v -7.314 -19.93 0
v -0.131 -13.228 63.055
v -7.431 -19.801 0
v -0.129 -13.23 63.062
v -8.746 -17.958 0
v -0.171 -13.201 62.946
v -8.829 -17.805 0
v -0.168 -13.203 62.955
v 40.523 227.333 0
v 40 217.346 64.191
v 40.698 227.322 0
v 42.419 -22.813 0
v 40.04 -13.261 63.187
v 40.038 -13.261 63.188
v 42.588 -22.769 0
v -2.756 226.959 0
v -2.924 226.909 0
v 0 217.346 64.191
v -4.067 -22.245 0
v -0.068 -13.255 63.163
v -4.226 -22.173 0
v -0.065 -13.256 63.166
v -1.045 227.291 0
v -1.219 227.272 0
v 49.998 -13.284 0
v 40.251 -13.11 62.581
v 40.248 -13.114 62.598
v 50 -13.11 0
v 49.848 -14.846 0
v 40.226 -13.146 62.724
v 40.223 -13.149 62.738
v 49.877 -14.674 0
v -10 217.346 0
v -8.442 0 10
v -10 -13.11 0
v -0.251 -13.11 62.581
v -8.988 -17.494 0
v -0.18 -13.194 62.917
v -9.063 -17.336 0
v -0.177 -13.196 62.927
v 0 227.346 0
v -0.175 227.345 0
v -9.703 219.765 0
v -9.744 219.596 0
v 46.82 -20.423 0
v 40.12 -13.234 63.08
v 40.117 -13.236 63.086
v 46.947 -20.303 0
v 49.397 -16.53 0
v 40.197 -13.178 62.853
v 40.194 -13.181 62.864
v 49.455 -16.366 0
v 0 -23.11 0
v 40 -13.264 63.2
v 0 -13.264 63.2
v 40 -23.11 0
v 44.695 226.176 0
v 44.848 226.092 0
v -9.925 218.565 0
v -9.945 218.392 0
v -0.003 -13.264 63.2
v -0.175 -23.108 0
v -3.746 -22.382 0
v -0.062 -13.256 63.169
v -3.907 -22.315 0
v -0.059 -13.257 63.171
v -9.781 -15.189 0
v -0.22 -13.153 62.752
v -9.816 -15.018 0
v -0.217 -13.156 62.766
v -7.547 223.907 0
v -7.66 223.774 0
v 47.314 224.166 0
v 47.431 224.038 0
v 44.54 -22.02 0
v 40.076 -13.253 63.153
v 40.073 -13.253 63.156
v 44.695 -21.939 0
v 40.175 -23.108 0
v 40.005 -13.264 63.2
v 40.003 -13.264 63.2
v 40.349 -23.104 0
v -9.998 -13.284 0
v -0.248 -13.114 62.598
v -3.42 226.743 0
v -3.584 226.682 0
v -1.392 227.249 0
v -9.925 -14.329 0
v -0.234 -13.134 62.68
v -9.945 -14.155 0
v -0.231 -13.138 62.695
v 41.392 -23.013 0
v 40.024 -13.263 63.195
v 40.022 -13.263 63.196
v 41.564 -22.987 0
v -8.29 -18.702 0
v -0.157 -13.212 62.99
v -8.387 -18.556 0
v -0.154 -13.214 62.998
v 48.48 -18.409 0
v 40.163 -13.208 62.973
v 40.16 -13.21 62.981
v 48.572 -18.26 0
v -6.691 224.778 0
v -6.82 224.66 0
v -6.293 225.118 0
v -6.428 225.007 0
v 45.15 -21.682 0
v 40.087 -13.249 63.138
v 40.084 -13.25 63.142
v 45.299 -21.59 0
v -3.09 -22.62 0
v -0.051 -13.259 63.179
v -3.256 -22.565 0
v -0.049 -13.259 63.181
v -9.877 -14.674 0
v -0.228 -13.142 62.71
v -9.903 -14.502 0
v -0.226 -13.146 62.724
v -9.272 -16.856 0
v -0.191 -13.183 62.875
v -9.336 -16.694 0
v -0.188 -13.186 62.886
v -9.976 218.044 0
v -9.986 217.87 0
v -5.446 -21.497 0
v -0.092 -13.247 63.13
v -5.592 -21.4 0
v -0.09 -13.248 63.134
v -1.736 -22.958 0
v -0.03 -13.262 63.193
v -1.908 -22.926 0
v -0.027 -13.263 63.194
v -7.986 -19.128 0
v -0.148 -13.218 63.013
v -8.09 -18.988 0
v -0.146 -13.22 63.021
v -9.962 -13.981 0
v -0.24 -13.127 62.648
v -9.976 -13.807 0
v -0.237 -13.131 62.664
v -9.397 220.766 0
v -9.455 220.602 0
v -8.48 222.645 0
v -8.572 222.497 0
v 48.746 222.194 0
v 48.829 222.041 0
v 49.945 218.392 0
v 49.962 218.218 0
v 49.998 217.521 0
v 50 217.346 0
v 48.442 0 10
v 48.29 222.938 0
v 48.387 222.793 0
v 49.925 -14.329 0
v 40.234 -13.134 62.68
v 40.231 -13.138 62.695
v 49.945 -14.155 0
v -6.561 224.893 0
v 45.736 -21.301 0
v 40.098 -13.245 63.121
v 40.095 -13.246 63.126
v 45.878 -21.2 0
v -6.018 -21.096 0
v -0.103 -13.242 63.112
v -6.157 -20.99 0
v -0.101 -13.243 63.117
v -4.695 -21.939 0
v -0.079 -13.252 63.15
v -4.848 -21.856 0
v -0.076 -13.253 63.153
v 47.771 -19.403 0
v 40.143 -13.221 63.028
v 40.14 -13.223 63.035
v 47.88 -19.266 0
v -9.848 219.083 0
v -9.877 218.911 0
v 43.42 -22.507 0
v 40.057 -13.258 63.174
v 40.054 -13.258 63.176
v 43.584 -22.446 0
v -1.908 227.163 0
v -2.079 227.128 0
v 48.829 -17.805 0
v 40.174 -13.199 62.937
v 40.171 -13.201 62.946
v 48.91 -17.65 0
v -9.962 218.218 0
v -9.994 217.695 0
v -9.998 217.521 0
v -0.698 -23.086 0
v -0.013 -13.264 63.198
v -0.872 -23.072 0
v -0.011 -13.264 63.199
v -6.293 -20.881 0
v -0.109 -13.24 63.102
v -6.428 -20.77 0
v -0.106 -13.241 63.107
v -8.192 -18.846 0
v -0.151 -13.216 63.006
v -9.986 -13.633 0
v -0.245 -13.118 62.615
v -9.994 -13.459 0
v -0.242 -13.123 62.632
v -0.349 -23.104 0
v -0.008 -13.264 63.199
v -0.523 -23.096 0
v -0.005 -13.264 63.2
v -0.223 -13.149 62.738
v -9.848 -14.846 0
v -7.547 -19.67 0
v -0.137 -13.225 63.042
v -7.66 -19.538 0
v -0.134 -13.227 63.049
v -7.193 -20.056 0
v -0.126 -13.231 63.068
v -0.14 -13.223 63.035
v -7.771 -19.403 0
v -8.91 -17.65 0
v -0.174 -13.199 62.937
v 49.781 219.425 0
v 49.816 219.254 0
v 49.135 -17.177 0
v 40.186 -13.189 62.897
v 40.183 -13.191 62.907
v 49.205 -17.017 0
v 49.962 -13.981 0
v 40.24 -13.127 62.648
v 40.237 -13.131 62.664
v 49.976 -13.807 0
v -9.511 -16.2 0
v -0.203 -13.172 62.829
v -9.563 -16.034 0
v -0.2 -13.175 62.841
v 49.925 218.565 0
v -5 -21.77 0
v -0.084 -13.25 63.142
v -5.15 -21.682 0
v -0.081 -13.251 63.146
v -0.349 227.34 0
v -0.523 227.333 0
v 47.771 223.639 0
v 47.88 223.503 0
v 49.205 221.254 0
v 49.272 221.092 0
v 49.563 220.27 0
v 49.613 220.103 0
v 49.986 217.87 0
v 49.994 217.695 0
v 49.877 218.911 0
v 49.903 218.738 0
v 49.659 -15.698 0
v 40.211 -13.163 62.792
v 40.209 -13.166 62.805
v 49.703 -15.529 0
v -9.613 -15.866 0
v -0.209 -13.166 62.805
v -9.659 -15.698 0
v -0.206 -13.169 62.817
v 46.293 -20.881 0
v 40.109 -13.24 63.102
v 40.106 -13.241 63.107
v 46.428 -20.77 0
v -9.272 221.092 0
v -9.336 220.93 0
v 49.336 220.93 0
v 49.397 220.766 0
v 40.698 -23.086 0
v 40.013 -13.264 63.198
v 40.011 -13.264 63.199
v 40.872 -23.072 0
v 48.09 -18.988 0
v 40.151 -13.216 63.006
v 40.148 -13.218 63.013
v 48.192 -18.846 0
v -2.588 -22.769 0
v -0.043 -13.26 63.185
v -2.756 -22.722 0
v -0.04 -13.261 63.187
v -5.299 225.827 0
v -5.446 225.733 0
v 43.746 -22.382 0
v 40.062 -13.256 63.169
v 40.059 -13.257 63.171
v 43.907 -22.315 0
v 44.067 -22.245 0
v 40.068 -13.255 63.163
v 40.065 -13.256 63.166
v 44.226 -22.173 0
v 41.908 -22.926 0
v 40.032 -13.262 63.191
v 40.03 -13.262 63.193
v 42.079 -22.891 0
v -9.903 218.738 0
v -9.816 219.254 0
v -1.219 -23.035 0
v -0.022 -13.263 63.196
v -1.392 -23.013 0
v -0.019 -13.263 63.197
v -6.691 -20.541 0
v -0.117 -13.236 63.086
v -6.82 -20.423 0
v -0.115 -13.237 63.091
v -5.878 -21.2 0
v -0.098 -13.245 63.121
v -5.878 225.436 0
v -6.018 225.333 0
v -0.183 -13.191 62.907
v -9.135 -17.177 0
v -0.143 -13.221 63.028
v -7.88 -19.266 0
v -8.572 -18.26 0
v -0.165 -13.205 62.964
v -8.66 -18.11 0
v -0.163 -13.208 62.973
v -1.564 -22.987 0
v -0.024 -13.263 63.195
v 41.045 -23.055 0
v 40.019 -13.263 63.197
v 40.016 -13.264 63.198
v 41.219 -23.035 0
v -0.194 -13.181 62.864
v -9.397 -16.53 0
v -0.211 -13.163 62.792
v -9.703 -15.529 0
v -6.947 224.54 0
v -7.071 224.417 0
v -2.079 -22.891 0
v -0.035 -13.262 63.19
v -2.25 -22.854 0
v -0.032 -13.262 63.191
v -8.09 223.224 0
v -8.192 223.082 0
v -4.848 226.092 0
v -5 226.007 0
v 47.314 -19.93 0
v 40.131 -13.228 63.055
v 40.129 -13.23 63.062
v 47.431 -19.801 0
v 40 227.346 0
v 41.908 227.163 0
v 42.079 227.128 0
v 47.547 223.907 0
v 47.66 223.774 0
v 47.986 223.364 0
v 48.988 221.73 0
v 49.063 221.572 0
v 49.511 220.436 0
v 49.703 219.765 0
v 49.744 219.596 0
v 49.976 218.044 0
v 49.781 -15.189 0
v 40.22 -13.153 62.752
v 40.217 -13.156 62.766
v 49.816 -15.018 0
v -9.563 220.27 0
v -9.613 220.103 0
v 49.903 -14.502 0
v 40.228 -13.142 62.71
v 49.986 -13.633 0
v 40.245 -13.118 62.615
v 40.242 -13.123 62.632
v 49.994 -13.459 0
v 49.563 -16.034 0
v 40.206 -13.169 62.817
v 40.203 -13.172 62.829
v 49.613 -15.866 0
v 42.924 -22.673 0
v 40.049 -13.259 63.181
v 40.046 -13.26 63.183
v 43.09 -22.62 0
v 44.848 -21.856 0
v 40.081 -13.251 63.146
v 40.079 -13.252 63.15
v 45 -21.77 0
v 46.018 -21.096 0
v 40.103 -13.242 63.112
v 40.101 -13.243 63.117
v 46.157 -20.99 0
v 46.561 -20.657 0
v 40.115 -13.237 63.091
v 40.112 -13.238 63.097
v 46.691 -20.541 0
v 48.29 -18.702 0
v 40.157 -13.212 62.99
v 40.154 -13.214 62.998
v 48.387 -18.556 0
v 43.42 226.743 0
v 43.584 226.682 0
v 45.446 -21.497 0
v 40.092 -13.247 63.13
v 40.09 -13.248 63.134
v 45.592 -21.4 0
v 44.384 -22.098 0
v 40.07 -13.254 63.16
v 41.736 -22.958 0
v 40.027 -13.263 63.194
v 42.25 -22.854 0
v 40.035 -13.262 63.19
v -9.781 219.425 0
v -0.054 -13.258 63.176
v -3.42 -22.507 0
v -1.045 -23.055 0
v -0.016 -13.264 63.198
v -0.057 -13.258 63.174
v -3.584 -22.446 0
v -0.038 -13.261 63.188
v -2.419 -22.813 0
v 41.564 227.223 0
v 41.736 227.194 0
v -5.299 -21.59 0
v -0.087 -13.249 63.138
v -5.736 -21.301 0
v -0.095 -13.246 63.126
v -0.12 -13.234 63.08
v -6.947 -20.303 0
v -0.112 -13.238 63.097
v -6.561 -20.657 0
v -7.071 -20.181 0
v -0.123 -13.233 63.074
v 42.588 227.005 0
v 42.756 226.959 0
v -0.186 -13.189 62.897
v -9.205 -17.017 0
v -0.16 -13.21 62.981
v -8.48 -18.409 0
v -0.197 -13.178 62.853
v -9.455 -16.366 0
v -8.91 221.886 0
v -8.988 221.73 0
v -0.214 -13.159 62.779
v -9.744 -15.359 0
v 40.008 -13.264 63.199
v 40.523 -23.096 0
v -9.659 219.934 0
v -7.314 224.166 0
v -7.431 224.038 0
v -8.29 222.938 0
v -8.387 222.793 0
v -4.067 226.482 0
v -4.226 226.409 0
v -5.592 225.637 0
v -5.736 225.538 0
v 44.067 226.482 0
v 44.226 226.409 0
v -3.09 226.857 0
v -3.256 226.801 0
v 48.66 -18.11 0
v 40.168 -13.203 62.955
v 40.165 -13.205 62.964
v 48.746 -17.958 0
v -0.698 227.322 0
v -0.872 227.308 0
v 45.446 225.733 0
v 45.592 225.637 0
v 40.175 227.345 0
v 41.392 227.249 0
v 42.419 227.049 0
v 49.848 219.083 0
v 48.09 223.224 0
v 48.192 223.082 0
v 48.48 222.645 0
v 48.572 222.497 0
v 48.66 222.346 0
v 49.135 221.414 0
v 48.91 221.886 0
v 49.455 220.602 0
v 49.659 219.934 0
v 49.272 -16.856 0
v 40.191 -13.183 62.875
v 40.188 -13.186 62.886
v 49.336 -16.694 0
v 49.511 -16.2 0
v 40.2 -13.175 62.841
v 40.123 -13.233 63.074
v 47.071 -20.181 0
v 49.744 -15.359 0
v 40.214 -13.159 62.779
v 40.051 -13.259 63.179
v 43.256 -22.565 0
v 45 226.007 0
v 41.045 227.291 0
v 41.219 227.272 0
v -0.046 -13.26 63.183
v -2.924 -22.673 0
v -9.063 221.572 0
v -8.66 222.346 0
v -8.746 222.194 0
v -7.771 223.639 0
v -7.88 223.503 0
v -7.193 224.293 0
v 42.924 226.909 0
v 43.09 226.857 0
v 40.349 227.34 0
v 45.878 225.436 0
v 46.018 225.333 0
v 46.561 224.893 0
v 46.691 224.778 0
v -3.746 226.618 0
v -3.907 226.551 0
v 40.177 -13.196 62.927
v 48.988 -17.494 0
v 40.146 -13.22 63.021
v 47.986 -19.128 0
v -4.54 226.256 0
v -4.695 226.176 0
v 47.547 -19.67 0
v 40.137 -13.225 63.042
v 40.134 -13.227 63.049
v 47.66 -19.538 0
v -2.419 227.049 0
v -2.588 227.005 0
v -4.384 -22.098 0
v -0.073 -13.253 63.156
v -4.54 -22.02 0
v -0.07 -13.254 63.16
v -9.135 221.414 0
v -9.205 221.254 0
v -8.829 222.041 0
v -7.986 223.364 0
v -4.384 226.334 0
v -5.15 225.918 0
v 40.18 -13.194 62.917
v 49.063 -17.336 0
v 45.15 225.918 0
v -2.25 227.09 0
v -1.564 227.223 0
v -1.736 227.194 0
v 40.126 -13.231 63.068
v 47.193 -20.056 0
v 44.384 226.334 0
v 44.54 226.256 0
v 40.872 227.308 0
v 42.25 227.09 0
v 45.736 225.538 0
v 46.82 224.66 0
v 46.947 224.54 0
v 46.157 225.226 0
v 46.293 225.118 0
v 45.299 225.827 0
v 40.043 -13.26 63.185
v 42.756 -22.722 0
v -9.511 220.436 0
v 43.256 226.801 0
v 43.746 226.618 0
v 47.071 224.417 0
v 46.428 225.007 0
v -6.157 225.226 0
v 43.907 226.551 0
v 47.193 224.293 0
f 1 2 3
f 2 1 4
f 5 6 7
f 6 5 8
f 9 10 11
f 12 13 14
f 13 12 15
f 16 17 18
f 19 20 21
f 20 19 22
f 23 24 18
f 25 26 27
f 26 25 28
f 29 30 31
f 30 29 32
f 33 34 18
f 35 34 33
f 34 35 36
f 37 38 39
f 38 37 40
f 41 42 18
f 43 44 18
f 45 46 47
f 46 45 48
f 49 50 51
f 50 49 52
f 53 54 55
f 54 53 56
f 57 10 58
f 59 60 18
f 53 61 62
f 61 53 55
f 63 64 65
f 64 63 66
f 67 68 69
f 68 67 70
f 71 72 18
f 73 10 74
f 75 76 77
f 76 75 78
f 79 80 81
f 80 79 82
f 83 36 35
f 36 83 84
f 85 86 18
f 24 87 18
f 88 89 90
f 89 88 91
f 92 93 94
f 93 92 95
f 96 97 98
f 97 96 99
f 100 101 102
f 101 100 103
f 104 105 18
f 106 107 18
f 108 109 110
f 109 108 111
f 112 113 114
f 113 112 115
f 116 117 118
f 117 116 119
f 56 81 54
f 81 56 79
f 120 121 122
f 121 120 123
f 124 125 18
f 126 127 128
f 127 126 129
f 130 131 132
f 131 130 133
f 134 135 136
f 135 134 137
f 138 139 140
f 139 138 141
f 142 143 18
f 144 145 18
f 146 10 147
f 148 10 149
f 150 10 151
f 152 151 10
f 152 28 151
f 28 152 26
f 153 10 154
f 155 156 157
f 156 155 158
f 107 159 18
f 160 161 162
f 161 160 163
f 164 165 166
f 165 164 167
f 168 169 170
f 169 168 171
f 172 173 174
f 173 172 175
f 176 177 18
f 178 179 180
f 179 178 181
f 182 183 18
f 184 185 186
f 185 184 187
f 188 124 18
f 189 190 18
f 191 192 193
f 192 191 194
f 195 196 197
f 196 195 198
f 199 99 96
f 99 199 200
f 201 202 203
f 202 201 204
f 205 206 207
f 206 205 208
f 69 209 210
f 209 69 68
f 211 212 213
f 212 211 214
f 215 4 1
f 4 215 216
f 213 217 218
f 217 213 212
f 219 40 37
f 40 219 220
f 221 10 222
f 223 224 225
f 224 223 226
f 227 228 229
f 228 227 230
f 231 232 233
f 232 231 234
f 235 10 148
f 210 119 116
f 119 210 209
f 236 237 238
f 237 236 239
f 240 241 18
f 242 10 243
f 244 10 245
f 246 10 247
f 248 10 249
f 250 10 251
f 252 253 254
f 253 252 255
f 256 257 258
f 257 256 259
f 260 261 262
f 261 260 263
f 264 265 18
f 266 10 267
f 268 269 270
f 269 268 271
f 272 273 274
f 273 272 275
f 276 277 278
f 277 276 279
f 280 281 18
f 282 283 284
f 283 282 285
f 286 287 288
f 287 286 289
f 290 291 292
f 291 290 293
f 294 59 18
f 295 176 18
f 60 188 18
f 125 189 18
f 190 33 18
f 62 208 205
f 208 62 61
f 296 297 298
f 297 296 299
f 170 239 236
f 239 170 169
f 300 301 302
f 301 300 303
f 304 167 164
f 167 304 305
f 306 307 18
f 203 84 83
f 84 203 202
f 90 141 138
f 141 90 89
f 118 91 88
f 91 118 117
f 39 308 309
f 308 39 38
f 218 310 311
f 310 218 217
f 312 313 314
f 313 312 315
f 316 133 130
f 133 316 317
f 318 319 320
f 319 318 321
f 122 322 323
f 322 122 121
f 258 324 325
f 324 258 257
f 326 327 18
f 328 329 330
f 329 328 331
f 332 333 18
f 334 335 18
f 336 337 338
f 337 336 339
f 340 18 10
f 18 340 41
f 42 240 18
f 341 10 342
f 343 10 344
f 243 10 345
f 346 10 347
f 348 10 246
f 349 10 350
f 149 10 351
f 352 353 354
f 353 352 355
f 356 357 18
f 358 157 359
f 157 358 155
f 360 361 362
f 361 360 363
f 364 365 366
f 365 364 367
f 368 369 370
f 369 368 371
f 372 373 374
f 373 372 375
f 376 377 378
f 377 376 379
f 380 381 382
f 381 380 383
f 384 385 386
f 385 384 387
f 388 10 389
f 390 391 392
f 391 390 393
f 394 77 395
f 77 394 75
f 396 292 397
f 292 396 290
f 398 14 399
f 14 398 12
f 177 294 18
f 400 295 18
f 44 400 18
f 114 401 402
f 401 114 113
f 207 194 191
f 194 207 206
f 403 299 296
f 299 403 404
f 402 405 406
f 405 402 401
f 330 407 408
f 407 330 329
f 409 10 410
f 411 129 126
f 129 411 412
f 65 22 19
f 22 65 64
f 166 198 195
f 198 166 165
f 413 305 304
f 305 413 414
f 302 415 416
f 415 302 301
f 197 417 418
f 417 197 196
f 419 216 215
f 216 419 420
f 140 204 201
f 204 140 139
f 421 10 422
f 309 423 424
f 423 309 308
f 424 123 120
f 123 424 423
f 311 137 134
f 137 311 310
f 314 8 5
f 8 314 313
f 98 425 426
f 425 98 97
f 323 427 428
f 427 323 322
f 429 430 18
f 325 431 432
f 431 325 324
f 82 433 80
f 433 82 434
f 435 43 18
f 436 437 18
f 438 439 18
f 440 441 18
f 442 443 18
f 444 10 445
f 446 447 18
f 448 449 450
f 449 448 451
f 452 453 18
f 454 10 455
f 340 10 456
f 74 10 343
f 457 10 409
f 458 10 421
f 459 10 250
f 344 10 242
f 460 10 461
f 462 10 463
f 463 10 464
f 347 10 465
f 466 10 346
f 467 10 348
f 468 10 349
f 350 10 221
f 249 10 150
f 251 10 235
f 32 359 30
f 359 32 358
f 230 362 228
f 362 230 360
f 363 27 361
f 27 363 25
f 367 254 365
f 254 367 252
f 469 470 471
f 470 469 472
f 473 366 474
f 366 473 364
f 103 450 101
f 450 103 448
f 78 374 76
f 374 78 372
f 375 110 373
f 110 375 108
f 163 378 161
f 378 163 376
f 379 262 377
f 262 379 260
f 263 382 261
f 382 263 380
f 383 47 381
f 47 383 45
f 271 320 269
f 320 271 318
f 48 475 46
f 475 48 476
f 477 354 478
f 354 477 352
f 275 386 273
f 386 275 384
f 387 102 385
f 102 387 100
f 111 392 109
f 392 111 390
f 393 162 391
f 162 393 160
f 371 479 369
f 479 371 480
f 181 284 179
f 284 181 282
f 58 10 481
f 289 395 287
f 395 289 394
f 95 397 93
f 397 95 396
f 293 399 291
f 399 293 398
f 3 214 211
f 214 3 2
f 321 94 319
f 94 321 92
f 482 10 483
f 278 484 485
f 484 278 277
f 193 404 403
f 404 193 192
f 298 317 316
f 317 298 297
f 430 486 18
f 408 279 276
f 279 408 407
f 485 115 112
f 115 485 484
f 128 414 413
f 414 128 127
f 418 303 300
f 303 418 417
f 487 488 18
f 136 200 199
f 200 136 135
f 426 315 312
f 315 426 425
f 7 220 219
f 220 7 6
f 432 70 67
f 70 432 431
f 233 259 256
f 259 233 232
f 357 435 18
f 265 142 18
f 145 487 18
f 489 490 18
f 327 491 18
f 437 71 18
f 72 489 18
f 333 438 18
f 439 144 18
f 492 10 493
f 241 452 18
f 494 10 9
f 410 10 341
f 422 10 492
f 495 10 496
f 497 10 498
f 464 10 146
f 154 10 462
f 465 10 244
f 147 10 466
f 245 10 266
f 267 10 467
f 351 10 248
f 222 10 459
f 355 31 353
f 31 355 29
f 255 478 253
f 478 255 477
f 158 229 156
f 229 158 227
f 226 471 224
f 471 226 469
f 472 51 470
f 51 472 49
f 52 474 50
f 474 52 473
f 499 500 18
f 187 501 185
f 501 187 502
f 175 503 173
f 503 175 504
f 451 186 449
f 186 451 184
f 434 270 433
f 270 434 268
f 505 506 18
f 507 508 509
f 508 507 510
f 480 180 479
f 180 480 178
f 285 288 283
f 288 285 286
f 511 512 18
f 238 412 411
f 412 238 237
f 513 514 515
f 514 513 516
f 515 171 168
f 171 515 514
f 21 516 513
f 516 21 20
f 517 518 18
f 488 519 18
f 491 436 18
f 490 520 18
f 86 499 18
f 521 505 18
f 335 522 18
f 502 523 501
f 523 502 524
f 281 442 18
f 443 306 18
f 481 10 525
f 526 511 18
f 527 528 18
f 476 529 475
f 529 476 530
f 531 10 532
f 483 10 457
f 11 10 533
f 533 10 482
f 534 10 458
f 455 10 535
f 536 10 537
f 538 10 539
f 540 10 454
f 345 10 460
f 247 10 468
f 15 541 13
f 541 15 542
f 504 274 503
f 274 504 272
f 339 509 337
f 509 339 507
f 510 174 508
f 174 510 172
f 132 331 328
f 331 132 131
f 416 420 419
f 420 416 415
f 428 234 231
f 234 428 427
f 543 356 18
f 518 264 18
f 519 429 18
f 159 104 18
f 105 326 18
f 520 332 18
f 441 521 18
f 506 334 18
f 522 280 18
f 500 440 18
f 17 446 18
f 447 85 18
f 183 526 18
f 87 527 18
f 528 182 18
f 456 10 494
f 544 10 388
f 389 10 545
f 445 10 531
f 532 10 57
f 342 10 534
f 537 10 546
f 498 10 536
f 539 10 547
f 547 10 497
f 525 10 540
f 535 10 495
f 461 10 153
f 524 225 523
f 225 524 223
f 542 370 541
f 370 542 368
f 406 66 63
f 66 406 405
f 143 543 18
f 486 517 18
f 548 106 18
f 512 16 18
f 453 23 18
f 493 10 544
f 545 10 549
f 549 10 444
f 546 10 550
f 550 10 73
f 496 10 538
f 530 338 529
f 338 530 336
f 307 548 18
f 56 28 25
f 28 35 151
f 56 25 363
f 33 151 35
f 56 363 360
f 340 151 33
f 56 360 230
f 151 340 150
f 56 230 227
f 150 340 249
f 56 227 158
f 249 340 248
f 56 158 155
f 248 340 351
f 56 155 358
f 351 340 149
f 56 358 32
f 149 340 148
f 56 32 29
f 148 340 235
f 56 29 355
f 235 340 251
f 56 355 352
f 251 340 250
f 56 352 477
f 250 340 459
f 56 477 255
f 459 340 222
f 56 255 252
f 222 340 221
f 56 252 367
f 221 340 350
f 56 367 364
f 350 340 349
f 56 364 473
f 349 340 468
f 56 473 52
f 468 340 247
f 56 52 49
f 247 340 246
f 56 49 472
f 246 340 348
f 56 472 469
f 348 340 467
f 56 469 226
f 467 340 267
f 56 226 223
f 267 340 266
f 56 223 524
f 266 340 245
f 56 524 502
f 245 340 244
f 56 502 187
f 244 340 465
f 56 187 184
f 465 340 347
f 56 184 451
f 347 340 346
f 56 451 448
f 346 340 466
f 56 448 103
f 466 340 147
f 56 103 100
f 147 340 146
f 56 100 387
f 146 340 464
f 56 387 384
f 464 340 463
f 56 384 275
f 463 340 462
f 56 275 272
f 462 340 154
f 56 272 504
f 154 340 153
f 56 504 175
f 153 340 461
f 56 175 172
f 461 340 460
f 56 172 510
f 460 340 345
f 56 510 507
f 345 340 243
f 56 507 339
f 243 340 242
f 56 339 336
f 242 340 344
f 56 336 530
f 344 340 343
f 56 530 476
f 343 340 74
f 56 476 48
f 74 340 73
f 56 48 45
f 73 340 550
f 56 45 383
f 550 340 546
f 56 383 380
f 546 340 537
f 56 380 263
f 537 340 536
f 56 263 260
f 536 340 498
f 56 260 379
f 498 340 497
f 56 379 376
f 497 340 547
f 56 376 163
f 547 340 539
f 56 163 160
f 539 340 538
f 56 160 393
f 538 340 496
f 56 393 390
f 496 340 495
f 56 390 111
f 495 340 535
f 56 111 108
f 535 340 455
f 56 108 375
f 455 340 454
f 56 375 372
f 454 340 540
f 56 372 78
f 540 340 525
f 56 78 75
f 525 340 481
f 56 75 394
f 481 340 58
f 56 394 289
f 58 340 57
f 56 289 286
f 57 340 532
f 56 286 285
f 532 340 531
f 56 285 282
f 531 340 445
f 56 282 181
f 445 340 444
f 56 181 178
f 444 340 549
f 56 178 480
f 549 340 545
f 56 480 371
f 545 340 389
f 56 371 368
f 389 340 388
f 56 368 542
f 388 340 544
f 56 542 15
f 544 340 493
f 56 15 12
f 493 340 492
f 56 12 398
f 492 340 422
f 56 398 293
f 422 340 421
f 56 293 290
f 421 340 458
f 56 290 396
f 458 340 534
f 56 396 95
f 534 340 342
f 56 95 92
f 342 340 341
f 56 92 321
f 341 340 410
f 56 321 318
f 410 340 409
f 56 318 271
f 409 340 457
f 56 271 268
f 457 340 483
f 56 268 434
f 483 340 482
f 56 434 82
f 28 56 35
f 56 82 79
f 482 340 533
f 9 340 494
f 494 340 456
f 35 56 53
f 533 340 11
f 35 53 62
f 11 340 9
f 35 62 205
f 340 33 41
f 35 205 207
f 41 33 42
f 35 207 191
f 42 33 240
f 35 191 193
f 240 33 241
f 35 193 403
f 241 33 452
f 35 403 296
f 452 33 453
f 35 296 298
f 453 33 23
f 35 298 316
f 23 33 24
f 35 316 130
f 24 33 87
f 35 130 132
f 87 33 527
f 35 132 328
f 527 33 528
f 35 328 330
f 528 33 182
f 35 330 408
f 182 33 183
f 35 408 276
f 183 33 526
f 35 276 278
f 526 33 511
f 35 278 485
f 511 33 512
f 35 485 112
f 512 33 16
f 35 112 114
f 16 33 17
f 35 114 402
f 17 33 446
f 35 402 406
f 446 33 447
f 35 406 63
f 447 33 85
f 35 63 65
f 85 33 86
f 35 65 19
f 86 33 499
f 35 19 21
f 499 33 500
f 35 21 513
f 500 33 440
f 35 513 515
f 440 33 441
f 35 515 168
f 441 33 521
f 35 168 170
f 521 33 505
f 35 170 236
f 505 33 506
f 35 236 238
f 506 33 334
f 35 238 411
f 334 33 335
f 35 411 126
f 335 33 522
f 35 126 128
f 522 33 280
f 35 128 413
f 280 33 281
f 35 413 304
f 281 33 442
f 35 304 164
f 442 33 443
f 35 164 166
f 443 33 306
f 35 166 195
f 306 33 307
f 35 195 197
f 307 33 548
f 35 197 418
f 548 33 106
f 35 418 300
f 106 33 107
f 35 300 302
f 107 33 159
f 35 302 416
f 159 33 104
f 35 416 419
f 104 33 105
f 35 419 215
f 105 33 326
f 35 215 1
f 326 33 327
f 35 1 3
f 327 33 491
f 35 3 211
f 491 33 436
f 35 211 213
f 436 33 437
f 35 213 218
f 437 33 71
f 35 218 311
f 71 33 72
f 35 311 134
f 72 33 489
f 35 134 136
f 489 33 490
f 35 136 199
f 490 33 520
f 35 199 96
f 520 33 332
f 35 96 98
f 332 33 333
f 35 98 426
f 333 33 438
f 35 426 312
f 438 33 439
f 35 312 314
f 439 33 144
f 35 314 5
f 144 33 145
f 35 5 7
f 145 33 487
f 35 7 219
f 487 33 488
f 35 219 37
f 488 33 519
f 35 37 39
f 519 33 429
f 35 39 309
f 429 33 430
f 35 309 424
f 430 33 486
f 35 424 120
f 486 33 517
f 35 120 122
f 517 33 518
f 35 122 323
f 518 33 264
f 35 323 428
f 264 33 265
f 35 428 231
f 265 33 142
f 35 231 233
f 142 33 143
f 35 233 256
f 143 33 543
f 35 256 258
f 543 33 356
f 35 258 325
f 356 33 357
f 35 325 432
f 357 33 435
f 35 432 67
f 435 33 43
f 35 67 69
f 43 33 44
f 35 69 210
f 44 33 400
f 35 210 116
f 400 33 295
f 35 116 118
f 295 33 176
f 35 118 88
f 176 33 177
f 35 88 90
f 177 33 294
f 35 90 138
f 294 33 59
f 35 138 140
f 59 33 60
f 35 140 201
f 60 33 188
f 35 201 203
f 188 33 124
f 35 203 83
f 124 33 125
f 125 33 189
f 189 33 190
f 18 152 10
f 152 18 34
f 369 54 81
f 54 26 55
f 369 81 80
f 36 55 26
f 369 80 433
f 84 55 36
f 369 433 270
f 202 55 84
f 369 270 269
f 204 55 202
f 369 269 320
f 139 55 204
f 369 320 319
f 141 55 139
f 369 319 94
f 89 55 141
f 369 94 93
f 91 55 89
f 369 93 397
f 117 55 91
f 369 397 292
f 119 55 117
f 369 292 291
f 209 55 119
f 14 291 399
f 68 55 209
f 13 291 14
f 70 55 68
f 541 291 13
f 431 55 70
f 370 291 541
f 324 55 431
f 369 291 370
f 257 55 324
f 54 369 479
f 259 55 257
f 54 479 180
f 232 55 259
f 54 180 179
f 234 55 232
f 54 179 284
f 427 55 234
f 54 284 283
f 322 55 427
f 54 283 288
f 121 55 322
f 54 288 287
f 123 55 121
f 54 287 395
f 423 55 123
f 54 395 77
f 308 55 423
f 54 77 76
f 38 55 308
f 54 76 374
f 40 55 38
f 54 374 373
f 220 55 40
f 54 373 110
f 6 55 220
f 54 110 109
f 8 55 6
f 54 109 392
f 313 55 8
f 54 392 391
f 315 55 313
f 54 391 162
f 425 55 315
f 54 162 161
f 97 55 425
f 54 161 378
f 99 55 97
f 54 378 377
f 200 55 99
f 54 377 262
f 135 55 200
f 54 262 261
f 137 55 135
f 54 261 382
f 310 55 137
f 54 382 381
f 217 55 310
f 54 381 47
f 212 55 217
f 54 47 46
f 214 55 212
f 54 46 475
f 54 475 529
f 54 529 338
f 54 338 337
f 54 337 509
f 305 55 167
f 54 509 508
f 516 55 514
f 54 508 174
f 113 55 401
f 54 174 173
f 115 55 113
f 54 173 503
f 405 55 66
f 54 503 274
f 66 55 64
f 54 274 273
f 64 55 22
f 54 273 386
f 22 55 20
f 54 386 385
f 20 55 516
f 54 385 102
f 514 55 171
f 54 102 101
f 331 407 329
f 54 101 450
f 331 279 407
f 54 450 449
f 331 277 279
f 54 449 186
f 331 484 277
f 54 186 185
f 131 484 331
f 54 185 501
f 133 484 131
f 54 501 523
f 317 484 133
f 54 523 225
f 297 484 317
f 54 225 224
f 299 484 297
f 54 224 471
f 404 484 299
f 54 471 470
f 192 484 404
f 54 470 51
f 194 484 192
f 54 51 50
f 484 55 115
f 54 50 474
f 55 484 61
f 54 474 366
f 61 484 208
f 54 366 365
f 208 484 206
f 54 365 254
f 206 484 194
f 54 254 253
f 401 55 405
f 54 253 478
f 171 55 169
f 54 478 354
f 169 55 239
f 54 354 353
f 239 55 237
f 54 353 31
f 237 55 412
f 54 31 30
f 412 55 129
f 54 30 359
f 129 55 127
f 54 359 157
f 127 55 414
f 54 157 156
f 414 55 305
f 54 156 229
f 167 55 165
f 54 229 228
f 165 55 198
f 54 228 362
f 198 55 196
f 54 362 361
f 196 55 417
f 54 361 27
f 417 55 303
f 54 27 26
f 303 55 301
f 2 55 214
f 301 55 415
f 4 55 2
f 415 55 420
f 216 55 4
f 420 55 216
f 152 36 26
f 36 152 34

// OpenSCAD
incline = 14; //Incline of the speaker in degrees.
length = 224; //Length of the speaker in millimetres.
width = 40; //Width of the footing.
wider_base = 10; //The base can be a bit wider.
thickness_base = 10;

$fa = 1;
$fs = 0.1;
/////////////////

height = sin(incline) * length;

difference() {
	minkowski() {
		translate([0, -sin(incline) * height, 0]) {
			cube([width, sin(incline) * height + cos(incline) * length, height + thickness_base]);
		}
		translate([0, 0, -height - thickness_base]) {
			cylinder(h=height + thickness_base, r1=wider_base, r2=0);
		}
	}
	translate([-wider_base, -wider_base - sin(incline) * height, -height - thickness_base]) {
		cube([width + wider_base * 2, sin(incline) * height + cos(incline) * length + wider_base * 2, height + thickness_base]);
	}
	translate([-wider_base, 0, thickness_base]) {
		rotate([incline, 0, 0]) {
			cube([width + wider_base * 2, length, length]);
		}
	}
}
